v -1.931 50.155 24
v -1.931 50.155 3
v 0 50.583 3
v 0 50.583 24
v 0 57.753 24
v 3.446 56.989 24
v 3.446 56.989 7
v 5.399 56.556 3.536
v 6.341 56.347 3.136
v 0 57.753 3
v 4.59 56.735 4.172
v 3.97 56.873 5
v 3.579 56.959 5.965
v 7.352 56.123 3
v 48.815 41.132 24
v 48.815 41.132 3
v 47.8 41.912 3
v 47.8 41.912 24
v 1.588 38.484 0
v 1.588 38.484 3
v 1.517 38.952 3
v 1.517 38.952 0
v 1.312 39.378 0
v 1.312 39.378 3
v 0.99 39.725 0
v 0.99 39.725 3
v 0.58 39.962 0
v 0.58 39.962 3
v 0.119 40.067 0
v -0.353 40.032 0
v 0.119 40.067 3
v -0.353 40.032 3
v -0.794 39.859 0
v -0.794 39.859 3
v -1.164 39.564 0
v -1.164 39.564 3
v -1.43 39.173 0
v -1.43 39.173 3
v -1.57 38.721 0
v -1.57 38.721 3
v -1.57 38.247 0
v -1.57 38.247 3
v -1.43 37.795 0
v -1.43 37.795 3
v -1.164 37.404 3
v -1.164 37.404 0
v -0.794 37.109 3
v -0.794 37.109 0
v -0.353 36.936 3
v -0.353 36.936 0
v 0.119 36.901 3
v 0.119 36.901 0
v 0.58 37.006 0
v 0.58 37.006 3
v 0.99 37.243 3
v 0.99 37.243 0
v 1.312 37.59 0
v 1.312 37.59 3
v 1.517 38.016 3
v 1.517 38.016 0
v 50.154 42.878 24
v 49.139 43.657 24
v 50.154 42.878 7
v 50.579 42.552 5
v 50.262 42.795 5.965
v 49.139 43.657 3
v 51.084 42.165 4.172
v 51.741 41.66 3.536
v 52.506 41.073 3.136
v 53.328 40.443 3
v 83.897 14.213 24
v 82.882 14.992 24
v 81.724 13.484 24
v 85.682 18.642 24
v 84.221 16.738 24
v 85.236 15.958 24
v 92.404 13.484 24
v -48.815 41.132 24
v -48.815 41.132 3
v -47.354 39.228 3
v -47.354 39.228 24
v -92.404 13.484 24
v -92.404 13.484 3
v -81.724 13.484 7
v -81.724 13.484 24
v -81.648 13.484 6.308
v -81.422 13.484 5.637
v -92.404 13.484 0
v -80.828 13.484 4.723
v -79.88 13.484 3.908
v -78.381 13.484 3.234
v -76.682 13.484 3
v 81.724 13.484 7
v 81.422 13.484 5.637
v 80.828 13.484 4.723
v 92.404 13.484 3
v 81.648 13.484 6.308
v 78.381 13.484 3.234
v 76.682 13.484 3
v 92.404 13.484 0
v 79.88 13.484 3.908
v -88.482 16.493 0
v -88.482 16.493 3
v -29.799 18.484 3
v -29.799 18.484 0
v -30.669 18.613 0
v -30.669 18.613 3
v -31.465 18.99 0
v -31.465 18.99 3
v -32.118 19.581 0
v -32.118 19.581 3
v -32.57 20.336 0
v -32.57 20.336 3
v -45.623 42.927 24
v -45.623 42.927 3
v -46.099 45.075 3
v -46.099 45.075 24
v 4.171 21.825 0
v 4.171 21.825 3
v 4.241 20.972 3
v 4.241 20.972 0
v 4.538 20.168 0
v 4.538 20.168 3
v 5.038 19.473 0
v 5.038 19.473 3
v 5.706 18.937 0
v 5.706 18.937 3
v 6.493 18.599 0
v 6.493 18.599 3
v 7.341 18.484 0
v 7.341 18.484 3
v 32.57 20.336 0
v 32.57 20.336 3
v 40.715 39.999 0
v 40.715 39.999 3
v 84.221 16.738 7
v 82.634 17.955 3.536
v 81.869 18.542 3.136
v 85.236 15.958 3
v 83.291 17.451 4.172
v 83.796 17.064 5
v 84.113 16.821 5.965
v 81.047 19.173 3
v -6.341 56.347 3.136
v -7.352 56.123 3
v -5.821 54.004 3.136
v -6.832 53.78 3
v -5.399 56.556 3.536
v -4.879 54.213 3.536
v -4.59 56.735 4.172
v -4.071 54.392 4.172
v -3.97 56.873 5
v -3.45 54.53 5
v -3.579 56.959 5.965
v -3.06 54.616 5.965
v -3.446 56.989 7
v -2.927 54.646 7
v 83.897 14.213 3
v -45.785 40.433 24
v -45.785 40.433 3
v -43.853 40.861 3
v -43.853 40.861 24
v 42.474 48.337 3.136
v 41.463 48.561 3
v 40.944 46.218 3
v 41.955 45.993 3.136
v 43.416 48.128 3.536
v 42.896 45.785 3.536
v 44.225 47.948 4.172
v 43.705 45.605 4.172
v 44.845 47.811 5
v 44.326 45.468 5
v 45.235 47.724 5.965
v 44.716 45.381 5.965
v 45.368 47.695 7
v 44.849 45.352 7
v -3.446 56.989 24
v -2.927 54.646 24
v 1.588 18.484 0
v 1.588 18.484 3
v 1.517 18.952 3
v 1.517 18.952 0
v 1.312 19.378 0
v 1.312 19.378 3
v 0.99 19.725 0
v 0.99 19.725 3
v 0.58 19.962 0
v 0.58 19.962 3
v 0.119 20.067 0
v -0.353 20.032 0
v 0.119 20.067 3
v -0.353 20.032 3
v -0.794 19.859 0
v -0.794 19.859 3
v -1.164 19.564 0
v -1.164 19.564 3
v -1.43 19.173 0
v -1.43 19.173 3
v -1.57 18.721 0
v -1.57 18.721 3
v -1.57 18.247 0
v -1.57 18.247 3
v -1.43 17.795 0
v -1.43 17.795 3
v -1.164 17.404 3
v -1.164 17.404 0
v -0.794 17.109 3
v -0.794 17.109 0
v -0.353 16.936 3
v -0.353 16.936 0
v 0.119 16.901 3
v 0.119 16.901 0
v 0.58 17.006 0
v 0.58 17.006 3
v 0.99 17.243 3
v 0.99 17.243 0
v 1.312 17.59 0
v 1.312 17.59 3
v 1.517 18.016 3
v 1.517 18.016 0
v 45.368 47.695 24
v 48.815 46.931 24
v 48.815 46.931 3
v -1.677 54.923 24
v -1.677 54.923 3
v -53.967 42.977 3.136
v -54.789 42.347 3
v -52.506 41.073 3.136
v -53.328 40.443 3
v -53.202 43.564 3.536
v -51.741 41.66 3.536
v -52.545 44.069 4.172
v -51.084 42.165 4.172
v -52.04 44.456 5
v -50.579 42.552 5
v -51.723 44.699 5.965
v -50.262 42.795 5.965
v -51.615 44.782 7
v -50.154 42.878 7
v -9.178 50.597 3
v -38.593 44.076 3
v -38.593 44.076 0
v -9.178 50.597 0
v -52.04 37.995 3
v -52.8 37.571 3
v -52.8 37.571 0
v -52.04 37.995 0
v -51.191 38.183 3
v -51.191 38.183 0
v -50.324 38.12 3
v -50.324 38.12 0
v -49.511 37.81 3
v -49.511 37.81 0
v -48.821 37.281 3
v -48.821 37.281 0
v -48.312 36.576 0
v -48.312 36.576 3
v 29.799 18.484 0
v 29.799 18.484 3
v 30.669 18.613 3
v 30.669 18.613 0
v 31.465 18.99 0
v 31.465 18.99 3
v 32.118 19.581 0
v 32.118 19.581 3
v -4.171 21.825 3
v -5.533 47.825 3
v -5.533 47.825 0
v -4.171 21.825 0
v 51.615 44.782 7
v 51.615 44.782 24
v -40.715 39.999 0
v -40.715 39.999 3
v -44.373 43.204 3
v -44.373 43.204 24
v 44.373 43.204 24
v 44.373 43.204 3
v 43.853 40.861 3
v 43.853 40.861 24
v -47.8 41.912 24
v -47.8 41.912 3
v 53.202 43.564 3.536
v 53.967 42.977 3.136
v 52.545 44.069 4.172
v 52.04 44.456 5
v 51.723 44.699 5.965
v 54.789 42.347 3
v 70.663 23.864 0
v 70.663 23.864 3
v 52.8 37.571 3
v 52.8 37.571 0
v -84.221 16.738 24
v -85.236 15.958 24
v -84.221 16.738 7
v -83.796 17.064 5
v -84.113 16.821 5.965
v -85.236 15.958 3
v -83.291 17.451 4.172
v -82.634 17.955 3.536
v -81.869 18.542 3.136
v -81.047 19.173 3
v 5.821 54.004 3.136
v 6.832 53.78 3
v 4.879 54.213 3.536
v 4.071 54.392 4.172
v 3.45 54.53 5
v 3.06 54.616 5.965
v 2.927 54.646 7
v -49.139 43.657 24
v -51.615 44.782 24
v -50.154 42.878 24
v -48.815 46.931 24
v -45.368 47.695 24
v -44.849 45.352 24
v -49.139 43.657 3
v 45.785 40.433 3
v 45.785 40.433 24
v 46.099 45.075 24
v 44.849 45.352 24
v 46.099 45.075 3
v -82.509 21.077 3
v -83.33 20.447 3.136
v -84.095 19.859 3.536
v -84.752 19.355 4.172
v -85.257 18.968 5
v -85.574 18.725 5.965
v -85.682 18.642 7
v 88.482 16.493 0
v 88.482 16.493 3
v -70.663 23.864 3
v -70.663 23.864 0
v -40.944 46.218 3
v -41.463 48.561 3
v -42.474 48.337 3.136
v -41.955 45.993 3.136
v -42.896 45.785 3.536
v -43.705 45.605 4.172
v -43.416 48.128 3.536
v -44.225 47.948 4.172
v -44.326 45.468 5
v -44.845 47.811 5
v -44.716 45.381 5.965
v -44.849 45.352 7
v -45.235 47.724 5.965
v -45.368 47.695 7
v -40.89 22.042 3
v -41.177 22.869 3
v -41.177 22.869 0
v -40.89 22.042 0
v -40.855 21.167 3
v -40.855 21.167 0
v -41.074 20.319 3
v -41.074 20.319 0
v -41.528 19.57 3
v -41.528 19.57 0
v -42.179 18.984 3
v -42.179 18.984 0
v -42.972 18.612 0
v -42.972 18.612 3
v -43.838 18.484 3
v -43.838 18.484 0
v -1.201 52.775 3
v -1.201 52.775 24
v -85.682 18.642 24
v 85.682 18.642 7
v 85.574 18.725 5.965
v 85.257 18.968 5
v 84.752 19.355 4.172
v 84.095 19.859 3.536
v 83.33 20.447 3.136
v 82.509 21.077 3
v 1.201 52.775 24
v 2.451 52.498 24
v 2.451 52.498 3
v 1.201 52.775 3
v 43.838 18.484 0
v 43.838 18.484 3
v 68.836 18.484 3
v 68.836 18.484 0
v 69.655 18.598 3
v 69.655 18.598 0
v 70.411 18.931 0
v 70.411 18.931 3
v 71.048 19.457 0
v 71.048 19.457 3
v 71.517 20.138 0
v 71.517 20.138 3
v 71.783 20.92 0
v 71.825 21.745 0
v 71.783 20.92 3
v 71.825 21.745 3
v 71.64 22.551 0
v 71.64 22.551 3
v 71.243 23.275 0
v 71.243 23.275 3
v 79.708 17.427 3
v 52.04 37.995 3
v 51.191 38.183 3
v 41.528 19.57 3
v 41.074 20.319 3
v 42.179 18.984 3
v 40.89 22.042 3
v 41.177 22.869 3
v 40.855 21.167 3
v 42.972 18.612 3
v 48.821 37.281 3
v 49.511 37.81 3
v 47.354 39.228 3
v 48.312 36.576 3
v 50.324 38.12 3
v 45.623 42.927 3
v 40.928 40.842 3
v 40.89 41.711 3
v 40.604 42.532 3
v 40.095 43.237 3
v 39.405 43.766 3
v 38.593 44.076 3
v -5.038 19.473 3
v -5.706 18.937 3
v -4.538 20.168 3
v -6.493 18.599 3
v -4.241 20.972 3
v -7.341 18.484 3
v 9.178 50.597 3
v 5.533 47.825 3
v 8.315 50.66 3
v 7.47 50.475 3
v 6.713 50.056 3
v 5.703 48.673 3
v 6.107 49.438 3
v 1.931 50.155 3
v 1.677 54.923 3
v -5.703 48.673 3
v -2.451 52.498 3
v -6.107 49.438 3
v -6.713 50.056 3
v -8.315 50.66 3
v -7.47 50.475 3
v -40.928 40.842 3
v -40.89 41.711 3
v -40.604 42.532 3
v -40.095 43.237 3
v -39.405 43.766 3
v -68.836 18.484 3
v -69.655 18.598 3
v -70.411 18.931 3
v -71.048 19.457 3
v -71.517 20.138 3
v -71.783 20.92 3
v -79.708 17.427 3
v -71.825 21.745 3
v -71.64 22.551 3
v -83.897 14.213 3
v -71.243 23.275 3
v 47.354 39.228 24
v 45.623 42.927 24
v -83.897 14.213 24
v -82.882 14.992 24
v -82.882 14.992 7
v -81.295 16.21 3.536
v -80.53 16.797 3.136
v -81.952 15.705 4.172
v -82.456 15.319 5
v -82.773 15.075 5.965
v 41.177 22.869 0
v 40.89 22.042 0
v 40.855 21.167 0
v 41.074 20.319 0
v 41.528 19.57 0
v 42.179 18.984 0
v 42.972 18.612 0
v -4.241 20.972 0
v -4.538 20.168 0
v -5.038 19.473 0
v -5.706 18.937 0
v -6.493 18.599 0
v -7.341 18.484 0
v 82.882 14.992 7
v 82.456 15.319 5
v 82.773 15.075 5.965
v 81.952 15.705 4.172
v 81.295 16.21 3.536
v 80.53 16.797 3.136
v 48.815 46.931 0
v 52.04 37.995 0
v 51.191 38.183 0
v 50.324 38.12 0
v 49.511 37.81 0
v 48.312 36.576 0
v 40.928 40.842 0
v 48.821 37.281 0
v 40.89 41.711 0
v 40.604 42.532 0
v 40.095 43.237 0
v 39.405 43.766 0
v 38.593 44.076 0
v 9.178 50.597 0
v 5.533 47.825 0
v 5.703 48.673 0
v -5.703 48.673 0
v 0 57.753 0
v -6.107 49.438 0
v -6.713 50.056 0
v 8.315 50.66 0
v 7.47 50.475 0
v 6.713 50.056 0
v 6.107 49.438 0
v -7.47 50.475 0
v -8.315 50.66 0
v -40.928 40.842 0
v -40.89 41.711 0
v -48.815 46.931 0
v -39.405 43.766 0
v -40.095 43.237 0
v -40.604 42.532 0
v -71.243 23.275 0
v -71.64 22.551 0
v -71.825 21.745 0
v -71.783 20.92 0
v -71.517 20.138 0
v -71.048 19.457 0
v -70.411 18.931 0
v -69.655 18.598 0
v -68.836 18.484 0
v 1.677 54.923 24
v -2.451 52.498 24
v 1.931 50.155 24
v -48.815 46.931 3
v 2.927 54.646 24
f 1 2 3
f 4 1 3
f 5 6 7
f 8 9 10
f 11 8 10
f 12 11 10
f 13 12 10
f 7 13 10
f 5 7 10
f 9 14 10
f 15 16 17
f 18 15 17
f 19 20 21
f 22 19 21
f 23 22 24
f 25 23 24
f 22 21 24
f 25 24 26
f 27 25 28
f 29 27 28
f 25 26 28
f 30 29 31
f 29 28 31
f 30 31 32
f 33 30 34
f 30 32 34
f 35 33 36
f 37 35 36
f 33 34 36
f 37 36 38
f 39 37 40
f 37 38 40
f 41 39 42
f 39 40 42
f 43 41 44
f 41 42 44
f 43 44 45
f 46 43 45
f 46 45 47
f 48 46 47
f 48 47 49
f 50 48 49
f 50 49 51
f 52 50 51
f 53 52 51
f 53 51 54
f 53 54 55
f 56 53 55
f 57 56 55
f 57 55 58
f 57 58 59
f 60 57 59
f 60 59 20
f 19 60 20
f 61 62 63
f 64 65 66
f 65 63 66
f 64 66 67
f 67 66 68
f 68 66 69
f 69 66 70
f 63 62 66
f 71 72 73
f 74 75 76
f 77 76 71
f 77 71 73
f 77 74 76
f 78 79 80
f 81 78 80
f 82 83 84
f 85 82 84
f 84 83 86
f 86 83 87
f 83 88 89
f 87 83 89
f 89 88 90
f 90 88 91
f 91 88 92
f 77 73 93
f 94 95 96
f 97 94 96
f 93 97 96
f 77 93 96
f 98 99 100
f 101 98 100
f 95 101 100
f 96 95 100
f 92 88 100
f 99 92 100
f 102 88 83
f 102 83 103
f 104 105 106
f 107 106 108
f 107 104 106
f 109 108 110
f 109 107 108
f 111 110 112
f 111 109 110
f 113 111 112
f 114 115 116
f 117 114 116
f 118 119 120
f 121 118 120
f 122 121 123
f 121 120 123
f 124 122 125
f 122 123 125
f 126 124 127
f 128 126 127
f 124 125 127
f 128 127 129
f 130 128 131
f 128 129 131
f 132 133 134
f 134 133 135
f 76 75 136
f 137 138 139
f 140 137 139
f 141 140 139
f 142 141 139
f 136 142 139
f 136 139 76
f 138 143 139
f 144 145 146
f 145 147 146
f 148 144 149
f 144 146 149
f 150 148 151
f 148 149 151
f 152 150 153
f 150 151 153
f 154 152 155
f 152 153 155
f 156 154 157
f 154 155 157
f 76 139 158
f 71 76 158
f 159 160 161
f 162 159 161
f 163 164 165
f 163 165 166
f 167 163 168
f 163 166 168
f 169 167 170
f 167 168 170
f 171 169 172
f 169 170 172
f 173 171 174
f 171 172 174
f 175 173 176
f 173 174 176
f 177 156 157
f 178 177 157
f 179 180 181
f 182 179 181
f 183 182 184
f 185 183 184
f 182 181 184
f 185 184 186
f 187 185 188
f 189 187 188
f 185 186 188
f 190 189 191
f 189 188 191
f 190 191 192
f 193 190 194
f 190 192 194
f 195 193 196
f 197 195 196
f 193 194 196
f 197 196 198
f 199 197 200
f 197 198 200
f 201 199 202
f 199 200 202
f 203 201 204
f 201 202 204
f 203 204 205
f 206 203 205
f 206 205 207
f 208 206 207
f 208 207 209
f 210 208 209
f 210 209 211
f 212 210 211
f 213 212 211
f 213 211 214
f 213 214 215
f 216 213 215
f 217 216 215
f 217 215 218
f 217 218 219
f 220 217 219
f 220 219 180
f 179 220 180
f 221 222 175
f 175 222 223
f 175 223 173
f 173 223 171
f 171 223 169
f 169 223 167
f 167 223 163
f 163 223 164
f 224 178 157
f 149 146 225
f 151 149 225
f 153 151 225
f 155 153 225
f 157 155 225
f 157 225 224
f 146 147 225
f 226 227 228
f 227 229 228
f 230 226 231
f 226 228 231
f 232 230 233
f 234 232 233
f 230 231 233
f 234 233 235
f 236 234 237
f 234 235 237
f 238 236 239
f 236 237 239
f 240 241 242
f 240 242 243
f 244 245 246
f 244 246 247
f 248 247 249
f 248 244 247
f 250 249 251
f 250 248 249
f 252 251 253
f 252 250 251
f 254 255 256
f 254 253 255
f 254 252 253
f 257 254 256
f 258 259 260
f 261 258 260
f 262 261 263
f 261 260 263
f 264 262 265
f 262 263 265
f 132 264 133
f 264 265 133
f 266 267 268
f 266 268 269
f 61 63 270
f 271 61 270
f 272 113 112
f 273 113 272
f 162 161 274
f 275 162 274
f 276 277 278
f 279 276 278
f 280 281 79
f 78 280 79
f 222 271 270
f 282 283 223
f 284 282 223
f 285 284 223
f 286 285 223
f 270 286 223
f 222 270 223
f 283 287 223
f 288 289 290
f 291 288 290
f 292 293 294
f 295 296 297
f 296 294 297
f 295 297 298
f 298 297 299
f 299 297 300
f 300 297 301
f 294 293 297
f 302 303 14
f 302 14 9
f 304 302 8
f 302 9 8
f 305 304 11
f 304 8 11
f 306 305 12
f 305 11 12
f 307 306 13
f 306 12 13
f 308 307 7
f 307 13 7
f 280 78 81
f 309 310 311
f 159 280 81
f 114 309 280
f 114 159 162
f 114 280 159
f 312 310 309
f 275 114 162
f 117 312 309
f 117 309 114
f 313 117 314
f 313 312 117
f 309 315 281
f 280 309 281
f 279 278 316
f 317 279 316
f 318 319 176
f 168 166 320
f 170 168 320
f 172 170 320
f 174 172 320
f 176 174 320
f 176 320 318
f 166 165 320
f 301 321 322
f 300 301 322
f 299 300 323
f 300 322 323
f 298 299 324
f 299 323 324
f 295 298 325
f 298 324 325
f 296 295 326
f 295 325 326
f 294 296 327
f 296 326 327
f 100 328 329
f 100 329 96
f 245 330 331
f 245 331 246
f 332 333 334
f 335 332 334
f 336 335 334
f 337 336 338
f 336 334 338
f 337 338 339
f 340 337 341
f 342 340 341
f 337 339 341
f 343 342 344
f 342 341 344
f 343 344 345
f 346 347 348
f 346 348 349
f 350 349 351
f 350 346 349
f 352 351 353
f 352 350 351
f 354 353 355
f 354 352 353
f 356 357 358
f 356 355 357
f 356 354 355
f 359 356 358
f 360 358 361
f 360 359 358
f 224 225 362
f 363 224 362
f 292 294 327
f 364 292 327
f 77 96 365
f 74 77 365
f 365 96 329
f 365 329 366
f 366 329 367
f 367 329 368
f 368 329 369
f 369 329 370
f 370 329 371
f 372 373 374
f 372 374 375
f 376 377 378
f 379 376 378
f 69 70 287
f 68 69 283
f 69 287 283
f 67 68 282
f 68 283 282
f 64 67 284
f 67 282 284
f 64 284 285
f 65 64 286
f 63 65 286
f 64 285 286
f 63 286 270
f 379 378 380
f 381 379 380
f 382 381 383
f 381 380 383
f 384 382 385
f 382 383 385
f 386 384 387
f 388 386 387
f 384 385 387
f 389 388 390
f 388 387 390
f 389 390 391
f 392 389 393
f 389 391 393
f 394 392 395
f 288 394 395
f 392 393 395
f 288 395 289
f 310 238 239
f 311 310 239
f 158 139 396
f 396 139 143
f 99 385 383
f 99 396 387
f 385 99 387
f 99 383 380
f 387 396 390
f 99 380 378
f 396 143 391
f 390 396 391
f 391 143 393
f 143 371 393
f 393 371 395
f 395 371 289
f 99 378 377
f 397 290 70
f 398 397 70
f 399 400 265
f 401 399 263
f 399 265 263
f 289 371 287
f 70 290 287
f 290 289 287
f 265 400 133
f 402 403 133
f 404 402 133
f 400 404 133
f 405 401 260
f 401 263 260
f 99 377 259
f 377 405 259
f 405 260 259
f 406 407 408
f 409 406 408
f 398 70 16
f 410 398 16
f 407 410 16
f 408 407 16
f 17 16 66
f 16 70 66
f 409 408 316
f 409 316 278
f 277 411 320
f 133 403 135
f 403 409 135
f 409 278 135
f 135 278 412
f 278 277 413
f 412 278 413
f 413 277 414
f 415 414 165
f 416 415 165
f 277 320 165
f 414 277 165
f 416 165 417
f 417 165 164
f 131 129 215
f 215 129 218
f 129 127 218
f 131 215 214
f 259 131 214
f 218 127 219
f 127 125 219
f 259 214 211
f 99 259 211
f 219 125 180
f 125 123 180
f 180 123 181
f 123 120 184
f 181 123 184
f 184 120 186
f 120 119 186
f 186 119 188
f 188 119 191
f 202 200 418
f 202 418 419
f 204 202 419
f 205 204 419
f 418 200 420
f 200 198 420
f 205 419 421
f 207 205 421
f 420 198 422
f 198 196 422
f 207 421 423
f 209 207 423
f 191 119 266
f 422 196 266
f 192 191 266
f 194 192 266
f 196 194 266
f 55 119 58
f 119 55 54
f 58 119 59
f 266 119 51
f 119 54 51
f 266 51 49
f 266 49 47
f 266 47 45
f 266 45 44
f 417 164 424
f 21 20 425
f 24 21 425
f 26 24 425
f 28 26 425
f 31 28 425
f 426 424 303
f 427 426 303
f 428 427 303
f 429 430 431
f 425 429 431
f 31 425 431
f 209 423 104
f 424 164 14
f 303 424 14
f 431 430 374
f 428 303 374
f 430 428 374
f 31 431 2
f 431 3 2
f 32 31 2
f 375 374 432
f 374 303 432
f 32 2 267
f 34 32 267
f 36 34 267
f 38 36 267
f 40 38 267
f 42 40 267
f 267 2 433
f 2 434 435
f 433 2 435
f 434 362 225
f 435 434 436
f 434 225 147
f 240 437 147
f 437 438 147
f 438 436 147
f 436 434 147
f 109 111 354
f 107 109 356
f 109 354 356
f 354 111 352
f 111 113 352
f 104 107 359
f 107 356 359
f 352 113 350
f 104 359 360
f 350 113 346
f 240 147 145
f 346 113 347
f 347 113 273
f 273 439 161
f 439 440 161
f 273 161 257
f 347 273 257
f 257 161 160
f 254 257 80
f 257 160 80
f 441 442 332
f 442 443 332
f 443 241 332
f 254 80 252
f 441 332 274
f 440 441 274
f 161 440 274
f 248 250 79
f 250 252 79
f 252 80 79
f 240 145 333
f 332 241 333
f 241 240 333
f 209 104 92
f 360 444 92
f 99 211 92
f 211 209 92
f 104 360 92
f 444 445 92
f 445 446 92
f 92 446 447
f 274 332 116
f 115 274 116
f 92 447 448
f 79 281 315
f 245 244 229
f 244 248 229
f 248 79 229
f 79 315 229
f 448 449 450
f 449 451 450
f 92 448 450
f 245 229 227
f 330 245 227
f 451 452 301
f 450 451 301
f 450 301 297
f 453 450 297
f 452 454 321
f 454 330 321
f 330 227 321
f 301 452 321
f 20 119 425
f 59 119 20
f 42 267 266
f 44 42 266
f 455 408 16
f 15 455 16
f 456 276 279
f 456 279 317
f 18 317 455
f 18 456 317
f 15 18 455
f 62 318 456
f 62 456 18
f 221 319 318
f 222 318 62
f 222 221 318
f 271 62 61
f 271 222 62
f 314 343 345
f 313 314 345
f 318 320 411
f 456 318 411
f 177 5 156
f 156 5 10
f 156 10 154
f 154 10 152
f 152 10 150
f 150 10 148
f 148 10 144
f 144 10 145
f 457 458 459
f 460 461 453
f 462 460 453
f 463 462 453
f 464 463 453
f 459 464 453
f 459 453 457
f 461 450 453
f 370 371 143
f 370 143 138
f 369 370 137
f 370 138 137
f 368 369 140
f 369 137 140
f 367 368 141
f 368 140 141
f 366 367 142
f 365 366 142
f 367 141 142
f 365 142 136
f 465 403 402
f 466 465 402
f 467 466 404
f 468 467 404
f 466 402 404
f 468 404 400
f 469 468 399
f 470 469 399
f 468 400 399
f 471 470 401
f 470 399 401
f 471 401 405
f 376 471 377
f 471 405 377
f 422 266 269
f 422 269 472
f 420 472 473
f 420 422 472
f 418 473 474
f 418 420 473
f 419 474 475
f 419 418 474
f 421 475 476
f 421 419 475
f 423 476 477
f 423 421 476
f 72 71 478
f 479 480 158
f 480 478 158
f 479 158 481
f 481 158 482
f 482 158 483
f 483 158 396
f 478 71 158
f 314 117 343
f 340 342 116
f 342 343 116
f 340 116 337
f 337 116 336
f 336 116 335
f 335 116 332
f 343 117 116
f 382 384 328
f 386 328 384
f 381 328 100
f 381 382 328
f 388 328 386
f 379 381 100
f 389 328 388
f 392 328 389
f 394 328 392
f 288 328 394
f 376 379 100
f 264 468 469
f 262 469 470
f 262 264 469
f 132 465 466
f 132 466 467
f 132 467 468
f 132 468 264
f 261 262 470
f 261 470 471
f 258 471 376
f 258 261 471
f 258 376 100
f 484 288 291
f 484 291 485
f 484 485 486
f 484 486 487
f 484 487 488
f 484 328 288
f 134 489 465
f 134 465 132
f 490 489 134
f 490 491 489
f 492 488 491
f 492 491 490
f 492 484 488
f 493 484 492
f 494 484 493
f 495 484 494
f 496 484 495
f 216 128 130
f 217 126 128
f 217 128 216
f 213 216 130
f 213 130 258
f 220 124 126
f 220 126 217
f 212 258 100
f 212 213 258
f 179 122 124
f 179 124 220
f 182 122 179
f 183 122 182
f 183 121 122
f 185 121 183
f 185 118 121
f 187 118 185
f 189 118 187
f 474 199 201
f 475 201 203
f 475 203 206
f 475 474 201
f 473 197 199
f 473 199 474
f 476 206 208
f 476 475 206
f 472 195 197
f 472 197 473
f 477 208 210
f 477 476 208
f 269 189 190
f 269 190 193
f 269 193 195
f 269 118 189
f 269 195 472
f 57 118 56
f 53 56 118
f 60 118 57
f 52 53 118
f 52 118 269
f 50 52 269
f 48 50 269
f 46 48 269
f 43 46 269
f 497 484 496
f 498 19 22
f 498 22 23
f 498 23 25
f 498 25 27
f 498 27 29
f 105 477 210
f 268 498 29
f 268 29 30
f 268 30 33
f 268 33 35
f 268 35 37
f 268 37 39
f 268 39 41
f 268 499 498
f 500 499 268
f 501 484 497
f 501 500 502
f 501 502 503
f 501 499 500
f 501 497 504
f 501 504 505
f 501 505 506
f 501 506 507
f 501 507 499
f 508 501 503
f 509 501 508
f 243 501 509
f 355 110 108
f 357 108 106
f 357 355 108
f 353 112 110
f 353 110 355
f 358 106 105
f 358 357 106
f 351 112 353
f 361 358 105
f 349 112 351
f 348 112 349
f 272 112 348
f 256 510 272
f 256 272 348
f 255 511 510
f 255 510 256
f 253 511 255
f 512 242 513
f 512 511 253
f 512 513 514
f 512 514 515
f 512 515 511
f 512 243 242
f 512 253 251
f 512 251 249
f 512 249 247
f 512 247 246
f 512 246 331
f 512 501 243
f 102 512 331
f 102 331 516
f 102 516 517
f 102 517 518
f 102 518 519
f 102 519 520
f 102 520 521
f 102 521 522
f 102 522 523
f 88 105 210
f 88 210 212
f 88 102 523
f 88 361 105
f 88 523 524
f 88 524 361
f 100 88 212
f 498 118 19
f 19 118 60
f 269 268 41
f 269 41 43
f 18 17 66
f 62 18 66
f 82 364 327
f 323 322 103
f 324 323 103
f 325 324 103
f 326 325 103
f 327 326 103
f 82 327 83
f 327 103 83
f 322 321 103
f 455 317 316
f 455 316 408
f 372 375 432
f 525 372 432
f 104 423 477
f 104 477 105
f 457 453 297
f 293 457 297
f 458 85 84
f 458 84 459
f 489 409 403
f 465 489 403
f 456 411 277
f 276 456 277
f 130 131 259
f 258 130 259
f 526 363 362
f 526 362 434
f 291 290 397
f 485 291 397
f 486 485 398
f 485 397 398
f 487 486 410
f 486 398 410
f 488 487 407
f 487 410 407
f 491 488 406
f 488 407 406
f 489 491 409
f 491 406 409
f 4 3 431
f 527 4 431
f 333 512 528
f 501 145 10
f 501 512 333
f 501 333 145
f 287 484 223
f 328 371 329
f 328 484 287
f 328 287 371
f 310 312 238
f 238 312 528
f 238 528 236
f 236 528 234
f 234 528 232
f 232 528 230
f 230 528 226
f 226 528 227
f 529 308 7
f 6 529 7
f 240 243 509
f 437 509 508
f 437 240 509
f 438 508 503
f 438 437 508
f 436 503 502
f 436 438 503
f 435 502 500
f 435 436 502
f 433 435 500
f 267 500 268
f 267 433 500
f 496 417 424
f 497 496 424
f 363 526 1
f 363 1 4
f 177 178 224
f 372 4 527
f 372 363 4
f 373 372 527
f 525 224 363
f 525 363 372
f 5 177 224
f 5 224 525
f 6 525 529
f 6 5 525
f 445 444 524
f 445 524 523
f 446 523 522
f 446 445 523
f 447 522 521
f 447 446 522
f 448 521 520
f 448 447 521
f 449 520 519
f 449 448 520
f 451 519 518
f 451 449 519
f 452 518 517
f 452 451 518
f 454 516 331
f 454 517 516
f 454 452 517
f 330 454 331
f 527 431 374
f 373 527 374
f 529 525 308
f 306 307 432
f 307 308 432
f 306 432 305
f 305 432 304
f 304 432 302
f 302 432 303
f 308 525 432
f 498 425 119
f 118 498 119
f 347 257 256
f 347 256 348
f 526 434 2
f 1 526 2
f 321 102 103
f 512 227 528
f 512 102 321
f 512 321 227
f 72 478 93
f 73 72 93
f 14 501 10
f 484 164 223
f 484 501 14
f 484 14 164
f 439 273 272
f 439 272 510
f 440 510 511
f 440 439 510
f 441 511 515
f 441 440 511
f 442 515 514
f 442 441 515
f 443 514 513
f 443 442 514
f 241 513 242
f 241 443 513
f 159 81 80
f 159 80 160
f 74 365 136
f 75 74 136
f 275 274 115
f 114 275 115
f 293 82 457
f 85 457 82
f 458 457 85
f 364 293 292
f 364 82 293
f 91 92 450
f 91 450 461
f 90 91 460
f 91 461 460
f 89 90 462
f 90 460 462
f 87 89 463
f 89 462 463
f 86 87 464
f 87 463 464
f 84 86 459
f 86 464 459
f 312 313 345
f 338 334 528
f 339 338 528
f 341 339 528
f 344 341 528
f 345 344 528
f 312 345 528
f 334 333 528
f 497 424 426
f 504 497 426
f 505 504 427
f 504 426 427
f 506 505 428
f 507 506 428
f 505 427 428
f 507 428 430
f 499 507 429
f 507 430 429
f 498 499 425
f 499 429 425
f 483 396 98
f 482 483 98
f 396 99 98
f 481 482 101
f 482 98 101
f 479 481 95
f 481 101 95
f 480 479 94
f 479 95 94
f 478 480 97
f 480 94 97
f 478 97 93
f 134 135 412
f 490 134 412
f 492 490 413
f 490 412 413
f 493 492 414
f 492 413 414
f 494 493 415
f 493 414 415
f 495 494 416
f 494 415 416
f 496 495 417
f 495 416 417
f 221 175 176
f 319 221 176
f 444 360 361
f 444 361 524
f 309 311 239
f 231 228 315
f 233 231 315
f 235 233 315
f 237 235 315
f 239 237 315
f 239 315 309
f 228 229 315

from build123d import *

# Parameters (mm, degrees)
BOSS_EXTRUDE1_DEPTH = 3
BOSS_EXTRUDE2_DEPTH = 21
SKETCH3_R           = 1.5875
CUT_EXTRUDE1_DEPTH  = 111.972114009
FILLET3_R           = 4
FILLET4_R           = 4


with BuildPart() as part:
    # Sketch1 → Boss-Extrude1 (new body)
    with BuildSketch(Plane.XY):
        Polygon((0, 57.752828942), (48.814800356, 46.930848245), (88.482467371, 16.492776794), (92.403575887, 13.484004407), (84.489061716, 13.484004407), (-84.489061716, 13.484004407), (-92.403575887, 13.484004407), (-88.482467371, 16.492776794), (-48.814800356, 46.930848245), align=None)
    extrude(amount=BOSS_EXTRUDE1_DEPTH)

    # Sketch2 → Boss-Extrude2 (add)
    with BuildSketch(Plane.XY.offset(3)):
        Polygon((-45.368475451, 47.694880082), (-48.814800356, 46.930848245), (-51.615337647, 44.781920401), (-50.154310218, 42.877872384), (-49.138817942, 43.657087013), (-47.799542798, 41.911709664), (-48.815035074, 41.132495035), (-47.354007644, 39.228447018), (-45.784645761, 40.432660745), (-43.853398153, 40.860808032), (-44.372853227, 43.203918449), (-45.622512116, 42.926875744), (-46.098679267, 45.074726959), (-44.849020377, 45.351769665), align=None)
        Polygon((0, 57.752828942), (-3.446324905, 56.988797105), (-2.926869832, 54.645686688), (-1.677210943, 54.922729393), (-1.201043792, 52.774878178), (-2.450702681, 52.497835472), (-1.931247608, 50.154725055), (0, 50.582872342), (1.931247608, 50.154725055), (2.450702681, 52.497835472), (1.201043792, 52.774878178), (1.677210943, 54.922729393), (2.926869832, 54.645686688), (3.446324905, 56.988797105), align=None)
        Polygon((-84.22090265, 16.737656622), (-85.681930079, 18.641704639), (-92.403575887, 13.484004407), (-81.724287495, 13.484004407), (-82.881627506, 14.992279274), (-83.897119781, 14.213064644), (-85.236394925, 15.958441993), align=None)
        Polygon((48.814800356, 46.930848245), (45.368475451, 47.694880082), (44.849020377, 45.351769665), (46.098679267, 45.074726959), (45.622512116, 42.926875744), (44.372853227, 43.203918449), (43.853398153, 40.860808032), (45.784645761, 40.432660745), (47.354007644, 39.228447018), (48.815035074, 41.132495035), (47.799542798, 41.911709664), (49.138817942, 43.657087013), (50.154310218, 42.877872384), (51.615337647, 44.781920401), align=None)
        Polygon((82.881627506, 14.992279274), (81.724287495, 13.484004407), (92.403575887, 13.484004407), (85.681930079, 18.641704639), (84.22090265, 16.737656622), (85.236394925, 15.958441993), (83.897119781, 14.213064644), align=None)
    extrude(amount=BOSS_EXTRUDE2_DEPTH)

    # Sketch3 → Cut-Extrude1 (cut, through all)
    with BuildSketch(Plane.XY.offset(3)):
        with Locations((0, 18.484004407)):
            Circle(SKETCH3_R)
        with Locations((0, 38.484004407)):
            Circle(SKETCH3_R)
        with BuildLine():
            Line((-70.662620138, 23.864064428), (-52.799548931, 37.570881053))
            ThreePointArc((-52.799548931, 37.570881053), (-50.323945802, 38.119709054), (-48.312232144, 36.576066872))
            Line((-48.312232144, 36.576066872), (-41.176915041, 22.869250246))
            ThreePointArc((-41.176915041, 22.869250246), (-41.273211929, 19.927684632), (-43.837947541, 18.484004407))
            Line((-43.837947541, 18.484004407), (-68.836335851, 18.484004407))
            ThreePointArc((-68.836335851, 18.484004407), (-71.677126239, 20.519686011), (-70.662620138, 23.864064428))
        make_face()
        with BuildLine():
            Line((-32.570257259, 20.33595411), (-40.714847995, 39.998735523))
            ThreePointArc((-40.714847995, 39.998735523), (-40.604241897, 42.53203166), (-38.592528239, 44.075673842))
            Line((-38.592528239, 44.075673842), (-9.178295063, 50.596652343))
            ThreePointArc((-9.178295063, 50.596652343), (-6.713094257, 50.055770329), (-5.533087617, 47.82477219))
            Line((-5.533087617, 47.82477219), (-4.17050626, 21.825171068))
            ThreePointArc((-4.17050626, 21.825171068), (-5.038091405, 19.473478629), (-7.341155033, 18.484004407))
            Line((-7.341155033, 18.484004407), (-29.798618662, 18.484004407))
            ThreePointArc((-29.798618662, 18.484004407), (-31.465329361, 18.98959557), (-32.570257259, 20.33595411))
        make_face()
        with BuildLine():
            Line((7.341155033, 18.484004407), (29.798618662, 18.484004407))
            ThreePointArc((29.798618662, 18.484004407), (31.465329361, 18.98959557), (32.570257259, 20.33595411))
            Line((32.570257259, 20.33595411), (40.714847995, 39.998735523))
            ThreePointArc((40.714847995, 39.998735523), (40.604241897, 42.53203166), (38.592528239, 44.075673842))
            Line((38.592528239, 44.075673842), (9.178295063, 50.596652343))
            ThreePointArc((9.178295063, 50.596652343), (6.713094257, 50.055770329), (5.533087617, 47.82477219))
            Line((5.533087617, 47.82477219), (4.17050626, 21.825171068))
            ThreePointArc((4.17050626, 21.825171068), (5.038091405, 19.473478629), (7.341155033, 18.484004407))
        make_face()
        with BuildLine():
            Line((43.837947541, 18.484004407), (68.836335851, 18.484004407))
            ThreePointArc((68.836335851, 18.484004407), (71.677126239, 20.519686011), (70.662620138, 23.864064428))
            Line((70.662620138, 23.864064428), (52.799548931, 37.570881053))
            ThreePointArc((52.799548931, 37.570881053), (50.323945802, 38.119709054), (48.312232144, 36.576066872))
            Line((48.312232144, 36.576066872), (41.176915041, 22.869250246))
            ThreePointArc((41.176915041, 22.869250246), (41.273211929, 19.927684632), (43.837947541, 18.484004407))
        make_face()
    extrude(amount=-CUT_EXTRUDE1_DEPTH, mode=Mode.SUBTRACT)

    # Fillet3
    fillet3_edges = [part.edges().sort_by_distance(p)[0] for p in [
        (-84.951416365, 17.689680631, 3),
    ]]
    fillet(fillet3_edges, radius=FILLET3_R)

    # Fillet4
    fillet4_edges = [part.edges().sort_by_distance(p)[0] for p in [
        (84.951416365, 17.689680631, 3),
        (50.884823932, 43.829896392, 3),
        (45.108747914, 46.523324874, 3),
        (3.186597368, 55.817241896, 3),
        (-3.186597368, 55.817241896, 3),
        (-45.108747914, 46.523324874, 3),
        (-82.302957501, 14.23814184, 3),
        (-50.884823932, 43.829896392, 3),
        (82.302957501, 14.23814184, 3),
    ]]
    fillet(fillet4_edges, radius=FILLET4_R)


solid = part.part
